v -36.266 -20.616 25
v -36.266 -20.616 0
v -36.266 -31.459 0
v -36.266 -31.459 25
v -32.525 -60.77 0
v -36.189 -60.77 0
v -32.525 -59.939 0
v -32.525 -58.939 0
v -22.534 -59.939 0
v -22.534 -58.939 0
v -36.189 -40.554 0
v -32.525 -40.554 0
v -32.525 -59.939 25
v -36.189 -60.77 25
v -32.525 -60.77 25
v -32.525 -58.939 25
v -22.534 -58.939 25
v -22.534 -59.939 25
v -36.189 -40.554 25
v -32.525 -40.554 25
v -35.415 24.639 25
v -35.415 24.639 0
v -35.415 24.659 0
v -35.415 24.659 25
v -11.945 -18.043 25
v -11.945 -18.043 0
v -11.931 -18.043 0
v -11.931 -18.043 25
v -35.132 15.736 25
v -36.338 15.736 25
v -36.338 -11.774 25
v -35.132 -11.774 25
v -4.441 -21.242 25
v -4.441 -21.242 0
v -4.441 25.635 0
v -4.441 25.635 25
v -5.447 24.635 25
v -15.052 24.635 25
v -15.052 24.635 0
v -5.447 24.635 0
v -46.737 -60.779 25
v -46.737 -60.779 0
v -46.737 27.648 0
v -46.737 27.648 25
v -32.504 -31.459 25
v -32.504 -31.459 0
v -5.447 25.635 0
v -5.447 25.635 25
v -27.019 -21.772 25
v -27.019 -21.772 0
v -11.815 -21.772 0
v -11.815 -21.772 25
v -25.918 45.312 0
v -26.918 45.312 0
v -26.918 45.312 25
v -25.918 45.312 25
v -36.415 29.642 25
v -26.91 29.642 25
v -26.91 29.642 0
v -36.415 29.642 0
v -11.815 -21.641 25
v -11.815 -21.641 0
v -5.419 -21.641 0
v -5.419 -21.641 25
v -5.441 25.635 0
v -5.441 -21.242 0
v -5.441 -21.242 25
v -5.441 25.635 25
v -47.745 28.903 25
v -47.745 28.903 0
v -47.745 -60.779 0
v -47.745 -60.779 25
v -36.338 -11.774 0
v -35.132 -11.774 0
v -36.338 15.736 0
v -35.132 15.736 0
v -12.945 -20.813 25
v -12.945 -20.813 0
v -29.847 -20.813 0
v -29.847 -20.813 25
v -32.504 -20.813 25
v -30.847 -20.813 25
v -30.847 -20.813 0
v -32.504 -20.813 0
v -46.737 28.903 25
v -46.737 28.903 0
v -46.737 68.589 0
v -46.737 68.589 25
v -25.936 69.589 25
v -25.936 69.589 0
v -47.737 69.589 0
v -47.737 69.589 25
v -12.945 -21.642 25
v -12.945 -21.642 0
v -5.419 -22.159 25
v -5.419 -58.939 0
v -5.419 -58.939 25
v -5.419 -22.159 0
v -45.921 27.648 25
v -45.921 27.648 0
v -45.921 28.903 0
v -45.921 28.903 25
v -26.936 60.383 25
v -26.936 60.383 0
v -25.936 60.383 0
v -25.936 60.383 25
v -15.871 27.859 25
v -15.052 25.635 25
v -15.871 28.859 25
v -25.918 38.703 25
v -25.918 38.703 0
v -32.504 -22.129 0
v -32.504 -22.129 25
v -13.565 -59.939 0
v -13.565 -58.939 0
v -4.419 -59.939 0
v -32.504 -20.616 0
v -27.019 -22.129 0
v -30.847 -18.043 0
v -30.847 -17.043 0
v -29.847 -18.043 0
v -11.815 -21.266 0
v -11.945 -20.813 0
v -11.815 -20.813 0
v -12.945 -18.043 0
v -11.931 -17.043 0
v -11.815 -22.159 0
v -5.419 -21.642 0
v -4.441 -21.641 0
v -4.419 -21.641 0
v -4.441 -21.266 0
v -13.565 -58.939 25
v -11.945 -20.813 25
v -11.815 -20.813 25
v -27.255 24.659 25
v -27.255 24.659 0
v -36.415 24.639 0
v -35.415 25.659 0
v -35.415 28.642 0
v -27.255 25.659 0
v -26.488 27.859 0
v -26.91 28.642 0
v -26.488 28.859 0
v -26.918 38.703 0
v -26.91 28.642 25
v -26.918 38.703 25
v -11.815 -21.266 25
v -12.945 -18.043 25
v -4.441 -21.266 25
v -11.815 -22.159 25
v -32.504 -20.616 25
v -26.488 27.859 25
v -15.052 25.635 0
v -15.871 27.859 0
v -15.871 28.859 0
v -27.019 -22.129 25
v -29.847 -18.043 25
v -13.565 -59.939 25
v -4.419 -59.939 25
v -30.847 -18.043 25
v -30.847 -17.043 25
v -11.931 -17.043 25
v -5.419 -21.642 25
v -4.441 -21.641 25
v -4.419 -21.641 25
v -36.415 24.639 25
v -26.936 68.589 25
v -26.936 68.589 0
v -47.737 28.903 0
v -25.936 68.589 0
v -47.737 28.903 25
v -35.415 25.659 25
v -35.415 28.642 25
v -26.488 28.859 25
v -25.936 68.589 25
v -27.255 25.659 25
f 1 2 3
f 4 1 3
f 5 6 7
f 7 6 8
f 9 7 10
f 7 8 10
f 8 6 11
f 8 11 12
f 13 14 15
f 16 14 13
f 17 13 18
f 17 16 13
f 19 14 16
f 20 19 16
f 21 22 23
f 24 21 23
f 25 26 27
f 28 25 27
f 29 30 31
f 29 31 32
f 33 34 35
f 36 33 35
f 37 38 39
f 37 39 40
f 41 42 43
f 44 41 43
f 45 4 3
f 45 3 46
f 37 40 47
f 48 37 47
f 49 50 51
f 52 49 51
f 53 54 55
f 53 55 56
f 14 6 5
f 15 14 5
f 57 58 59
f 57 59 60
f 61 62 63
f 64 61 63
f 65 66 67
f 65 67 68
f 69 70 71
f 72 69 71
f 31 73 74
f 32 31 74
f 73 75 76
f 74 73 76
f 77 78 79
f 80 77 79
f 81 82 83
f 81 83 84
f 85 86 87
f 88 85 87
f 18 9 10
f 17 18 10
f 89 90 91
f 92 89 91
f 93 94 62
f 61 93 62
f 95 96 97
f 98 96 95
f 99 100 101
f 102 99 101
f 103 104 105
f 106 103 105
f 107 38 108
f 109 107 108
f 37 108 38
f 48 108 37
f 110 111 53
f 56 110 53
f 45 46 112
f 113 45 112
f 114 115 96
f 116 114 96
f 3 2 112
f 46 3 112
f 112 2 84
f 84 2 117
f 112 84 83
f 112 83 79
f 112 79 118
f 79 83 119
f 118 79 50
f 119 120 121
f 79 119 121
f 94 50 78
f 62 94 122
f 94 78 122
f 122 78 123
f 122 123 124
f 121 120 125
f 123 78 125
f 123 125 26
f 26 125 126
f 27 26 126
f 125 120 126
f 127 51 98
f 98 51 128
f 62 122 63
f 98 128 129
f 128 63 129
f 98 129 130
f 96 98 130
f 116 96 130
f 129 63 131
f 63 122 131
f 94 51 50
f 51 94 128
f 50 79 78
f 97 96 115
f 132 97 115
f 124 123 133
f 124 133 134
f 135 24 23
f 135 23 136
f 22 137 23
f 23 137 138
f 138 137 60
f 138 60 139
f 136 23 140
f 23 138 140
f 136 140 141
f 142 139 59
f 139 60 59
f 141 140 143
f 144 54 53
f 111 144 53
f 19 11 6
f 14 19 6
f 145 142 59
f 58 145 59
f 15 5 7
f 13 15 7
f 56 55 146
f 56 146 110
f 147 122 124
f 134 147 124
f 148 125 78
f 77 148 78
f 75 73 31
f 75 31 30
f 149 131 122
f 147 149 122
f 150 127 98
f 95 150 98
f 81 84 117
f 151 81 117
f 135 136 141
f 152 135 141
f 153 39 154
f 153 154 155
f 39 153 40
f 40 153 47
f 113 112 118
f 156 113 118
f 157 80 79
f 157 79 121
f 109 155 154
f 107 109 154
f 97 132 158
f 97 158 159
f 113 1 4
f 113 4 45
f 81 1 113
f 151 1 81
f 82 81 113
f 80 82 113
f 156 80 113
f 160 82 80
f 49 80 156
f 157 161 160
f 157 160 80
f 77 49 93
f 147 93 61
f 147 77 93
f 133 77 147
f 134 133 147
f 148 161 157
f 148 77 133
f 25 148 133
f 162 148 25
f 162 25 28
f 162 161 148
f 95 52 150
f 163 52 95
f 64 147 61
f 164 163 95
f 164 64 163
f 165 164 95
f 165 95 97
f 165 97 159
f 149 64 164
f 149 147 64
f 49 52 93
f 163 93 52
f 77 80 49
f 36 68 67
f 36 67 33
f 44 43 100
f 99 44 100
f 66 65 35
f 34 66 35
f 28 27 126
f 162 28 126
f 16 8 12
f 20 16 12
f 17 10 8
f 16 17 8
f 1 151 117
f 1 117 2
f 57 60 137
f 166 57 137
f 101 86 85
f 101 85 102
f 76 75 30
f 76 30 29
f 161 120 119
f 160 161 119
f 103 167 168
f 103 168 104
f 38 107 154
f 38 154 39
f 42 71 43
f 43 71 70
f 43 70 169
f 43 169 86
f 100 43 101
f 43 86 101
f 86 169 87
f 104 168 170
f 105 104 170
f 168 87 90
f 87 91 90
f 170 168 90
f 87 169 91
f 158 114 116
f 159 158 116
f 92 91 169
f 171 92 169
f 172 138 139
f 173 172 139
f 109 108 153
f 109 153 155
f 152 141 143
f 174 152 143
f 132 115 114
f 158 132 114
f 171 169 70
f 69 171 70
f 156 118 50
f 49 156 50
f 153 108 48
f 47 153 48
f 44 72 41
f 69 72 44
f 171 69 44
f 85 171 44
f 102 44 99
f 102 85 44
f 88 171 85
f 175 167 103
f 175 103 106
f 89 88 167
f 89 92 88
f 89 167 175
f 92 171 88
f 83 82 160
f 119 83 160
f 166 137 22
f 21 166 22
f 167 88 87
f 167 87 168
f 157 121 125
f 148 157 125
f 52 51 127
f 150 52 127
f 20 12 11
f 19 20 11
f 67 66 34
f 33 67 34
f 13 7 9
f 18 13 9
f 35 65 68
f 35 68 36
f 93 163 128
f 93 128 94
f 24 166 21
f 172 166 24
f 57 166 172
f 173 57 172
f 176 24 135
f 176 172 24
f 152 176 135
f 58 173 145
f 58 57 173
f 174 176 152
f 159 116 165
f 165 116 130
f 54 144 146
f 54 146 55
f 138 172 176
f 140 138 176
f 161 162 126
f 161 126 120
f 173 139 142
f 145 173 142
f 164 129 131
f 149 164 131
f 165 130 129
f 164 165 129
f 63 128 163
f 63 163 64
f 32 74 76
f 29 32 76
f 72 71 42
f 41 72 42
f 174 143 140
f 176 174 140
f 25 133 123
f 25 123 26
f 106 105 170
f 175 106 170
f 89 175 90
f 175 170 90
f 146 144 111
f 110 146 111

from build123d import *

# Parameters (mm, degrees)
F0_W     = 0.9822489917
F0_H     = 1
F0_W_2   = 1
F0_H_2   = 39.6854430437
F0_W_3   = 0.8165633082
F0_H_3   = 1.2549050152
F0_W_4   = 1.0076368451
F0_H_4   = 88.427413255
F1_DEPTH = 25
F0_W_5   = 8.1607067734
F0_W_6   = 9.6052740701
F0_H_5   = 46.8777269125
F0_W_7   = 1.2060105801
F0_H_6   = 27.5101391599
F0_H_7   = 6.6097080708
F0_H_8   = 2.7701912224
F0_W_8   = 0.1297352612
F0_H_9   = 0.4526546001
F0_W_9   = 0.9778391793
F0_H_10  = 0.0009115074
F0_H_11  = 36.779815495
F0_W_10  = 9.9911410362
F0_W_11  = 2.5544827804


with BuildPart() as f1:
    # F0 (on Top) → F1 (new body)
    with BuildSketch(Plane.XY):
        Polygon((-25.935596019, 68.5887262225), (-26.9178450108, 68.5887262225), (-26.935596019, 68.5887262225), (-26.935596019, 60.3826455772), (-25.935596019, 60.3826455772), align=None)
        Polygon((-26.935596019, 68.5887262225), (-26.9178450108, 68.5887262225), (-26.9178450108, 69.5887262225), (-46.7308796942, 69.5887262225), (-46.7308796942, 68.5887262225), align=None)
        with Locations((-26.4267205149, 69.0887262225)):
            Rectangle(F0_W, F0_H)
        Polygon((-46.7374978364, 68.5887262225), (-46.7308796942, 68.5887262225), (-46.7308796942, 69.5887262225), (-47.7374978364, 69.5887262225), (-47.7374978364, 68.5887262225), align=None)
        with Locations((-47.2374978364, 48.7460047007)):
            Rectangle(F0_W_2, F0_H_2)
        Polygon((-46.7374978364, 27.6483781636), (-46.7374978364, 28.9032831788), (-47.7374978364, 28.9032831788), (-47.7451346815, 28.9032831788), (-47.7451346815, 27.6483781636), align=None)
        with Locations((-46.3292161822, 28.2758306712)):
            Rectangle(F0_W_3, F0_H_3)
        with Locations((-47.2413162589, -16.5653284639)):
            Rectangle(F0_W_4, F0_H_4)
    extrude(amount=F1_DEPTH)


with BuildPart() as f1b:
    # F0 (on Top) → F1, piece 2 (new body)
    with BuildSketch(Plane.XY):
        Polygon((-26.9095953554, 29.6416189522), (-36.4152640104, 29.6416189522), (-36.4152640104, 28.6416189522), (-35.4152640104, 28.6416189522), (-26.9095953554, 28.6416189522), align=None)
        Polygon((-35.4152640104, 28.6416189522), (-36.4152640104, 28.6416189522), (-36.4152640104, 24.6393531561), (-35.4152640104, 24.6393531561), (-35.4152640104, 24.658517912), (-35.4152640104, 25.658517912), align=None)
        with Locations((-31.3349106237, 25.158517912)):
            Rectangle(F0_W_5, F0_H)
        Polygon((-26.4879707247, 28.8592035174), (-27.254557237, 25.658517912), (-27.254557237, 24.658517912), (-26.4879707247, 27.8592035174), align=None)
    extrude(amount=F1_DEPTH)


with BuildPart() as f1c:
    # F0 (on Top) → F1, piece 3 (new body)
    with BuildSketch(Plane.XY):
        Polygon((-15.8707499504, 28.8592035174), (-15.8707499504, 27.8592035174), (-15.051796101, 24.6353933364), (-15.051796101, 25.6353933364), align=None)
        with Locations((-10.249159066, 25.1353933364)):
            Rectangle(F0_W_6, F0_H)
    extrude(amount=F1_DEPTH)


with BuildPart() as f1d:
    # F0 (on Top) → F1, piece 4 (new body)
    with BuildSketch(Plane.XY):
        with Locations((-4.9409140721, 2.1965298802)):
            Rectangle(F0_W_2, F0_H_5)
    extrude(amount=F1_DEPTH)


with BuildPart() as f1e:
    # F0 (on Top) → F1, piece 5 (new body)
    with BuildSketch(Plane.XY):
        with Locations((-35.7350893319, 1.9806777127)):
            Rectangle(F0_W_7, F0_H_6)
    extrude(amount=F1_DEPTH)


with BuildPart() as f1f:
    # F0 (on Top) → F1, piece 6 (new body)
    with BuildSketch(Plane.XY):
        with Locations((-26.4178450108, 42.0074574649)):
            Rectangle(F0_W_2, F0_H_7)
    extrude(amount=F1_DEPTH)


with BuildPart() as f1g:
    # F0 (on Top) → F1, piece 7 (new body)
    with BuildSketch(Plane.XY):
        Polygon((-11.9309797883, -17.0430857688), (-30.8471769094, -17.0430857688), (-30.8471769094, -18.0430857688), (-30.8466330171, -18.0430857688), (-29.8466330171, -18.0430857688), (-12.9449134693, -18.0430857688), (-11.9449134693, -18.0430857688), (-11.9309797883, -18.0430857688), align=None)
        with Locations((-30.3466330171, -19.42818138)):
            Rectangle(F0_W_2, F0_H_8)
        with Locations((-12.4449134693, -19.42818138)):
            Rectangle(F0_W_2, F0_H_8)
        Polygon((-29.8466330171, -20.8132769912), (-30.8466330171, -20.8132769912), (-32.5041981414, -20.8132769912), (-32.5041981414, -22.1292804927), (-27.0190900192, -22.1292804927), (-27.0190900192, -21.7722989619), (-27.0190900192, -20.8132769912), align=None)
        with Locations((-11.8800458387, -21.0396042913)):
            Rectangle(F0_W_8, F0_H_9)
        with Locations((-12.4449134693, -21.0396042913)):
            Rectangle(F0_W_2, F0_H_9)
        Polygon((-32.5041981414, -22.1292804927), (-32.5041981414, -20.8132769912), (-32.5041981414, -20.6163469702), (-36.2664051354, -20.6163469702), (-36.2664051354, -31.4594507217), (-32.5041981414, -31.4594507217), align=None)
        Polygon((-12.9449134693, -21.2659315914), (-12.9449134693, -20.8132769912), (-27.0190900192, -20.8132769912), (-27.0190900192, -21.7722989619), (-11.8151782081, -21.7722989619), (-11.8151782081, -21.6418225318), (-12.9449134693, -21.6418225318), align=None)
        Polygon((-11.8151782081, -21.2659315914), (-11.9449134693, -21.2659315914), (-12.9449134693, -21.2659315914), (-12.9449134693, -21.6418225318), (-11.8151782081, -21.6409110244), align=None)
        Polygon((-4.4409140721, -21.2659315914), (-11.8151782081, -21.2659315914), (-11.8151782081, -21.6409110244), (-5.4187532514, -21.6409110244), (-4.4409140721, -21.6409110244), align=None)
        Polygon((-11.8151782081, -21.6418225318), (-11.8151782081, -21.7722989619), (-11.8151782081, -22.1594162285), (-5.4187532514, -22.1594162285), (-5.4187532514, -21.6418225318), align=None)
        Polygon((-4.4187532514, -21.6409110244), (-4.4409140721, -21.6409110244), (-4.4409140721, -21.6418225318), (-5.4187532514, -21.6418225318), (-5.4187532514, -22.1594162285), (-4.4187532514, -22.1594162285), align=None)
        with Locations((-4.9298336618, -21.6413667781)):
            Rectangle(F0_W_9, F0_H_10)
        with Locations((-4.9187532514, -40.549323976)):
            Rectangle(F0_W_2, F0_H_11)
        Polygon((-4.4187532514, -58.9392317235), (-5.4187532514, -58.9392317235), (-13.5648781434, -58.9392317235), (-13.5648781434, -59.9392317235), (-4.4187532514, -59.9392317235), align=None)
    extrude(amount=F1_DEPTH)


with BuildPart() as f1h:
    # F0 (on Top) → F1, piece 8 (new body)
    with BuildSketch(Plane.XY):
        with Locations((-27.5295078754, -59.4392317235)):
            Rectangle(F0_W_10, F0_H)
        with Locations((-33.8023197837, -59.4392317235)):
            Rectangle(F0_W_11, F0_H)
        Polygon((-35.0795611739, -58.9392317235), (-32.5250783935, -58.9392317235), (-32.5250783935, -40.5536033213), (-36.1894406378, -40.5536033213), (-36.1894406378, -60.770124197), (-32.5250783935, -60.770124197), (-32.5250783935, -59.9392317235), (-35.0795611739, -59.9392317235), align=None)
    extrude(amount=F1_DEPTH)


solid = Compound([f1.part, f1b.part, f1c.part, f1d.part, f1e.part, f1f.part, f1g.part, f1h.part])
